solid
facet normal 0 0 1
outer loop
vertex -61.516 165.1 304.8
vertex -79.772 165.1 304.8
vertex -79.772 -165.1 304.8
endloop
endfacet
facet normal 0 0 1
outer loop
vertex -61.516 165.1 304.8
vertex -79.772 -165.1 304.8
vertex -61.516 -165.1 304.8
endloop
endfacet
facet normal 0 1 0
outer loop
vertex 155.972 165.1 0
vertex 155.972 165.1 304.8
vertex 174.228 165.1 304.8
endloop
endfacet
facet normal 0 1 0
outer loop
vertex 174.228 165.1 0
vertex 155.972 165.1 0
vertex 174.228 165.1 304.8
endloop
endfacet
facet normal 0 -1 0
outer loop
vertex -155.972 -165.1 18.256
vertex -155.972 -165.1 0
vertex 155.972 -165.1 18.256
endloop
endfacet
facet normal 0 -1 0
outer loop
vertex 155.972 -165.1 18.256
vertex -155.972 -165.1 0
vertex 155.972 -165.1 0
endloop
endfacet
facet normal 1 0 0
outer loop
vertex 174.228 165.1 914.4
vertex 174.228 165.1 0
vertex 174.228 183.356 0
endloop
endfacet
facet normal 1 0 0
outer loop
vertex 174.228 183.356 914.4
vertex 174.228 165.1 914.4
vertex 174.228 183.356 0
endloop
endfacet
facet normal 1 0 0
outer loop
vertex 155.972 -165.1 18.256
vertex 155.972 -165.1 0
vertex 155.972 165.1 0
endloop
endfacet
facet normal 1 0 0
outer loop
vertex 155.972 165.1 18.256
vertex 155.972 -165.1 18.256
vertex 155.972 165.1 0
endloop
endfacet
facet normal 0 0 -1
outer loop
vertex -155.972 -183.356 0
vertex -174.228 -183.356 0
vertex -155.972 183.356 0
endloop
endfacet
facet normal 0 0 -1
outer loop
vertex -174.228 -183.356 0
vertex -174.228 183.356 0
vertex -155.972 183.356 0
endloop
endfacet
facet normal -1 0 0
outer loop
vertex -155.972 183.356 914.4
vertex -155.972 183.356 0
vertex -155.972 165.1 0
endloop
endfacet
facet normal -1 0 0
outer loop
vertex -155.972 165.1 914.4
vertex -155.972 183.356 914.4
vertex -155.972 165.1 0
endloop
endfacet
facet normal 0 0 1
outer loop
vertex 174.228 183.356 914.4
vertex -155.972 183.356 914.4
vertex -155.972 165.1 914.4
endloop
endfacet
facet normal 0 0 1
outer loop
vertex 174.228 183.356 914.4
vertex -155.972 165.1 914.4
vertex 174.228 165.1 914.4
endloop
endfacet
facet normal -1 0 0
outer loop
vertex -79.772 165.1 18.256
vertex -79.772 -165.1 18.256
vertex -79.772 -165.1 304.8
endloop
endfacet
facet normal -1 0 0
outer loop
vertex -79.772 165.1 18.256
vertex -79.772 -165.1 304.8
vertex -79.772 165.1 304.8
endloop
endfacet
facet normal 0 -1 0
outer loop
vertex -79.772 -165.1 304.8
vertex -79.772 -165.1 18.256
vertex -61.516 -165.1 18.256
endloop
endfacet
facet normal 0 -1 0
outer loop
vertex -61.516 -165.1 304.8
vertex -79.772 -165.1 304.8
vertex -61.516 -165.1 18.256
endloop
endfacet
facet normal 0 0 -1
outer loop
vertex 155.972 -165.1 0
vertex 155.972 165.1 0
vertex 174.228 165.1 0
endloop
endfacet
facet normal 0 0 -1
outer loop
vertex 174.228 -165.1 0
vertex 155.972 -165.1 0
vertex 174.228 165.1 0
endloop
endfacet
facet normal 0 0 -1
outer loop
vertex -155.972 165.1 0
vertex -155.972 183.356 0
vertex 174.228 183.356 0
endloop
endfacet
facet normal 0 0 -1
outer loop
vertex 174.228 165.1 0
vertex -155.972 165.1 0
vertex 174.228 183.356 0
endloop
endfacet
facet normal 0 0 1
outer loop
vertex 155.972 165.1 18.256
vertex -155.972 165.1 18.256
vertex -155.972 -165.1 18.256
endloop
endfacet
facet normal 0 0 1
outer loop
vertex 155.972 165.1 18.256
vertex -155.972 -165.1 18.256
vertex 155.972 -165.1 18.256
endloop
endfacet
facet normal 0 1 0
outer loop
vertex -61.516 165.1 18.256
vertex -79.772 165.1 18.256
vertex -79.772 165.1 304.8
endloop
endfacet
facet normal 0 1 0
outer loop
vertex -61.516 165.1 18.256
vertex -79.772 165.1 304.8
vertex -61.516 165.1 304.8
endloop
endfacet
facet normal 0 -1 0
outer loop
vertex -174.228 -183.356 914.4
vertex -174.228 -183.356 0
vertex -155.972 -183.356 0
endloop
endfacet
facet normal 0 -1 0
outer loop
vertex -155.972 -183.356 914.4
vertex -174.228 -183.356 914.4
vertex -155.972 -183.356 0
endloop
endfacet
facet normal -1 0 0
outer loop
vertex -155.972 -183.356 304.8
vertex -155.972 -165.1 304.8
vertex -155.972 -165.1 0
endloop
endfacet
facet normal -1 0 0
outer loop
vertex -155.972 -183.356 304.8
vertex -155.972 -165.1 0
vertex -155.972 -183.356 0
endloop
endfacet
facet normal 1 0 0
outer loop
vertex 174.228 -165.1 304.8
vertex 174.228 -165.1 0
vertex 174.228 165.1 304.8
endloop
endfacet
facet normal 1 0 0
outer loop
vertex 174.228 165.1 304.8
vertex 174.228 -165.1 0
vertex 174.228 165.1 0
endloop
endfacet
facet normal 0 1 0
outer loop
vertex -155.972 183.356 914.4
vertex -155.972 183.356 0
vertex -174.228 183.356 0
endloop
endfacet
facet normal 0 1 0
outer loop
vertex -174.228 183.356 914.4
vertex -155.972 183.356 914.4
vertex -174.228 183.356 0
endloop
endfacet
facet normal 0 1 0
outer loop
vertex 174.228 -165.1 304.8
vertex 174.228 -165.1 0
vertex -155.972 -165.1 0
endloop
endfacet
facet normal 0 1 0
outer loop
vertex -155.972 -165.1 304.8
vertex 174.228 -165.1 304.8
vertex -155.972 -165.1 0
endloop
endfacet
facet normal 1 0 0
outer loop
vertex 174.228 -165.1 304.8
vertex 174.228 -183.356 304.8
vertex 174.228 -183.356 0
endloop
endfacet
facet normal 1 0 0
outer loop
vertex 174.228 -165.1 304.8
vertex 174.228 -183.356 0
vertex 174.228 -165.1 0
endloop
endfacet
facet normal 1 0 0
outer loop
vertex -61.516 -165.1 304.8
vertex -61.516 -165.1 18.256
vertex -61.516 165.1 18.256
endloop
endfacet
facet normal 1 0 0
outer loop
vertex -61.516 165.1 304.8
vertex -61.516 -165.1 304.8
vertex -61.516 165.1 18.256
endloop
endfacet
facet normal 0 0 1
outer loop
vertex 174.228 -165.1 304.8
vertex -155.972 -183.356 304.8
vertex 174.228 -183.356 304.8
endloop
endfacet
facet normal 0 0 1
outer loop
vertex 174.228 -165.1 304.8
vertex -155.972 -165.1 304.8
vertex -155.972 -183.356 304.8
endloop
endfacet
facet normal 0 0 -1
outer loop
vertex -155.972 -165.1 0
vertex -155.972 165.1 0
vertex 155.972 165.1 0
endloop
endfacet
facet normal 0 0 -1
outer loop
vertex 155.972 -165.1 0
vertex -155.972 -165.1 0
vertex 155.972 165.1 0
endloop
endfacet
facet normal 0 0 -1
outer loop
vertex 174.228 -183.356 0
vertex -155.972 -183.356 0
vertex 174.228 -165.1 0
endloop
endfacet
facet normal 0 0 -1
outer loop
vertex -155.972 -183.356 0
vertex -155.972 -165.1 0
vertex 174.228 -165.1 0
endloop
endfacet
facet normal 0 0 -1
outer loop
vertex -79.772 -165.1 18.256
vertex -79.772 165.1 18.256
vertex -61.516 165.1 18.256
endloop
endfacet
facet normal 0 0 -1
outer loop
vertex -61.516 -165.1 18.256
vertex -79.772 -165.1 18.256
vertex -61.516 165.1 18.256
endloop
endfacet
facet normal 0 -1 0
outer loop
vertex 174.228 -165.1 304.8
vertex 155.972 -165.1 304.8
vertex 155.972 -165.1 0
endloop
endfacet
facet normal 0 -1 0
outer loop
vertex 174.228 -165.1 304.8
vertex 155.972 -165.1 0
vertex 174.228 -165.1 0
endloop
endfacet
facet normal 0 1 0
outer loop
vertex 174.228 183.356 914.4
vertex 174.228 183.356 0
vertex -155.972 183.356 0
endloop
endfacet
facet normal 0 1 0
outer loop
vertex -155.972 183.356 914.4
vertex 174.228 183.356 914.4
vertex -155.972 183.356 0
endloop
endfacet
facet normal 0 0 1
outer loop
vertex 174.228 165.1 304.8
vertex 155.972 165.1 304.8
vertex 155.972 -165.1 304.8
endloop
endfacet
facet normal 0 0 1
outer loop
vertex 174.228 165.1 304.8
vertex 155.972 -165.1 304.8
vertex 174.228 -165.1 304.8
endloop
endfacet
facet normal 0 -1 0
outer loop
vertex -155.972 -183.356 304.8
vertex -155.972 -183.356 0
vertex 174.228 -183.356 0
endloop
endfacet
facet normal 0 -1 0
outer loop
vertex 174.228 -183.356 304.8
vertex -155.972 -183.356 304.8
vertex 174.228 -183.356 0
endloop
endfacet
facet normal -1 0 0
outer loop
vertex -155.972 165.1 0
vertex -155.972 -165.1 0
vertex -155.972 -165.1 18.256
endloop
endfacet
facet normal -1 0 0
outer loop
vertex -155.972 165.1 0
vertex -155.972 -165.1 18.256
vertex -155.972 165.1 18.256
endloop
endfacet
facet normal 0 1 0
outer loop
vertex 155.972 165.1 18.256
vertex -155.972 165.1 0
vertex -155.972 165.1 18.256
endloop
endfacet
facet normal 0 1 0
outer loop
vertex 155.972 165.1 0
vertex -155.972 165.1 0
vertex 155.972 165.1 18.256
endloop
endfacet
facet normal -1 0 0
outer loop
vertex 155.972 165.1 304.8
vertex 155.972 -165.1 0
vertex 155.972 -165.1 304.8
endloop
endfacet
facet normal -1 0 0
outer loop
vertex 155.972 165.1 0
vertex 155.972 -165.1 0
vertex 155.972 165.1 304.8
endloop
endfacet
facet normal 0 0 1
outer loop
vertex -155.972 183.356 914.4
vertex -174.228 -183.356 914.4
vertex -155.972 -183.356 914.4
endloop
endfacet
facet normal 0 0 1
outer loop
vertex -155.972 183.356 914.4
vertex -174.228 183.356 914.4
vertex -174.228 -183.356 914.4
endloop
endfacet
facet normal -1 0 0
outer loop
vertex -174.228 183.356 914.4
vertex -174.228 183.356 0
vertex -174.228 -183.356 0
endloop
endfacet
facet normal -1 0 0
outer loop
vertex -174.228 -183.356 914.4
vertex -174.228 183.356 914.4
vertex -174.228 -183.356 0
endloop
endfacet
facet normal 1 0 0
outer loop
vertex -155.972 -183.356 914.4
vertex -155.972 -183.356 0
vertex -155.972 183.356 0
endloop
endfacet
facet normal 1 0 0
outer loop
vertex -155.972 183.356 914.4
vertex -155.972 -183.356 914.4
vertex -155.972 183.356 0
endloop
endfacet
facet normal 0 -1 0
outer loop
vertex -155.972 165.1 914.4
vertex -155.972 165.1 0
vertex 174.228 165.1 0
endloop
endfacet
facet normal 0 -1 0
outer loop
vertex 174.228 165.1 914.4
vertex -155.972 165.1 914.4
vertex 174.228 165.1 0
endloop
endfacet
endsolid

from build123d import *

# Parameters (mm, degrees)
F4_W      = 311.94375
F4_H      = 330.2
F5_DEPTH  = 18.25625
F6_DEPTH  = 914.4
F7_DEPTH  = 914.4
F8_DEPTH  = 304.8
F3_W      = 18.25625
F3_H      = 330.2
F9_DEPTH  = 304.8
F10_W     = 18.25625
F10_H     = 330.2
F11_DEPTH = 286.54375


# Not quite as in the source:
# - a length typed as a fraction of an inch, garbled in the dataset ("3 / 203.2 mm" for 3/8 in), is restored


with BuildPart() as f5:
    # F4 (on Top) → F5 (new body)
    with BuildSketch(Plane.XY):
        Rectangle(F4_W, F4_H)
    extrude(amount=F5_DEPTH)


with BuildPart() as f6:
    # F3 (on Top) → F6 (new body)
    with BuildSketch(Plane.XY):
        Polygon((-174.228125, -183.35625), (-155.971875, -183.35625), (-155.971875, -165.1), (-155.971875, 165.1), (-155.971875, 183.35625), (-174.228125, 183.35625), align=None)
    extrude(amount=F6_DEPTH)


with BuildPart() as f7:
    # F3 (on Top) → F7 (new body)
    with BuildSketch(Plane.XY):
        Polygon((155.971875, 165.1), (174.228125, 165.1), (174.228125, 183.35625), (-155.971875, 183.35625), (-155.971875, 165.1), align=None)
    extrude(amount=F7_DEPTH)


with BuildPart() as f8:
    # F3 (on Top) → F8 (new body)
    with BuildSketch(Plane.XY):
        Polygon((-155.971875, -183.35625), (174.228125, -183.35625), (174.228125, -165.1), (155.971875, -165.1), (-155.971875, -165.1), align=None)
    extrude(amount=F8_DEPTH)


with BuildPart() as f9:
    # F3 (on Top) → F9 (new body)
    with BuildSketch(Plane.XY):
        with Locations((165.1, 0)):
            Rectangle(F3_W, F3_H)
    extrude(amount=F9_DEPTH)


with BuildPart() as f11:
    # F10 (on face) → F11 (new body, through all)
    with BuildSketch(Plane.XY.offset(18.25625)):
        with Locations((-70.64375, 0)):
            Rectangle(F10_W, F10_H)
    extrude(amount=F11_DEPTH)


solid = Compound([f5.part, f6.part, f7.part, f8.part, f9.part, f11.part])
